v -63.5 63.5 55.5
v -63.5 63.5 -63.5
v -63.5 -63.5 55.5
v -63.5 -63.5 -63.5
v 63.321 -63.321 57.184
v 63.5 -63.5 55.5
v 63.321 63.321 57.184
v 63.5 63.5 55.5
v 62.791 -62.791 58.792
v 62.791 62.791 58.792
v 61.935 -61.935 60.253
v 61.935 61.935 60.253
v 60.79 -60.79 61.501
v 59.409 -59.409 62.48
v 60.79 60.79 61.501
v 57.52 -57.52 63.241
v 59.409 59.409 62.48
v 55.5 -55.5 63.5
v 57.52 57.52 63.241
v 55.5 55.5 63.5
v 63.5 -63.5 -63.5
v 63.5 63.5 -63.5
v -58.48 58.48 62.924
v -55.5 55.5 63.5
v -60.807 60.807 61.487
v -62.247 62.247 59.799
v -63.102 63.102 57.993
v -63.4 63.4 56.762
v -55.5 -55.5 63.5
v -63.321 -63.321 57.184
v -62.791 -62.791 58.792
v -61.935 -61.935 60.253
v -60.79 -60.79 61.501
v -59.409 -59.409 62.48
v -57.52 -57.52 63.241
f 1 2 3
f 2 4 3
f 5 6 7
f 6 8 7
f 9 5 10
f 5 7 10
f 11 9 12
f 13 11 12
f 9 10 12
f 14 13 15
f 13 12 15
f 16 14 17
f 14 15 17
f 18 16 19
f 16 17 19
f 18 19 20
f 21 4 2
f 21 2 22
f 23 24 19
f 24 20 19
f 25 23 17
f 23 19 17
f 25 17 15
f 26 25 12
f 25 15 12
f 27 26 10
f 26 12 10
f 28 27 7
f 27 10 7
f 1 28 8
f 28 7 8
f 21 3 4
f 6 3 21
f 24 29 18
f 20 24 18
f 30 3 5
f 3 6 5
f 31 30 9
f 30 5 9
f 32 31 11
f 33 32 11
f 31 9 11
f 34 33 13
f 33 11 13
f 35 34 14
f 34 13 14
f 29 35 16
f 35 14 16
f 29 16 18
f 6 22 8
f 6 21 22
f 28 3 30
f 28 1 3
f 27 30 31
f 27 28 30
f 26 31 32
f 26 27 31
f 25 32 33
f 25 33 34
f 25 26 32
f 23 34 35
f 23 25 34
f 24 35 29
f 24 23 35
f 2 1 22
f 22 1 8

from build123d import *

# Parameters (mm, degrees)
F0_W     = 127
F0_H     = 127
F1_DEPTH = 63.5
F2_R     = 8


# Not quite as in the source:
# - the program builds the solid bodies; features that only make, move or delete a surface that nothing else refers to are left out


with BuildPart() as f1:
    # F0 (on Front) → F1 (new body, symmetric)
    with BuildSketch(Plane.XZ):
        Rectangle(F0_W, F0_H)
    extrude(amount=F1_DEPTH, both=True)

    # F2
    f2_edges = [f1.edges().sort_by_distance(p)[0] for p in [
        (63.5, 0, 63.5),
        (0, 63.5, 63.5),
        (-63.5, 0, 63.5),
        (0, -63.5, 63.5),
    ]]
    fillet(f2_edges, radius=F2_R)


solid = f1.part
